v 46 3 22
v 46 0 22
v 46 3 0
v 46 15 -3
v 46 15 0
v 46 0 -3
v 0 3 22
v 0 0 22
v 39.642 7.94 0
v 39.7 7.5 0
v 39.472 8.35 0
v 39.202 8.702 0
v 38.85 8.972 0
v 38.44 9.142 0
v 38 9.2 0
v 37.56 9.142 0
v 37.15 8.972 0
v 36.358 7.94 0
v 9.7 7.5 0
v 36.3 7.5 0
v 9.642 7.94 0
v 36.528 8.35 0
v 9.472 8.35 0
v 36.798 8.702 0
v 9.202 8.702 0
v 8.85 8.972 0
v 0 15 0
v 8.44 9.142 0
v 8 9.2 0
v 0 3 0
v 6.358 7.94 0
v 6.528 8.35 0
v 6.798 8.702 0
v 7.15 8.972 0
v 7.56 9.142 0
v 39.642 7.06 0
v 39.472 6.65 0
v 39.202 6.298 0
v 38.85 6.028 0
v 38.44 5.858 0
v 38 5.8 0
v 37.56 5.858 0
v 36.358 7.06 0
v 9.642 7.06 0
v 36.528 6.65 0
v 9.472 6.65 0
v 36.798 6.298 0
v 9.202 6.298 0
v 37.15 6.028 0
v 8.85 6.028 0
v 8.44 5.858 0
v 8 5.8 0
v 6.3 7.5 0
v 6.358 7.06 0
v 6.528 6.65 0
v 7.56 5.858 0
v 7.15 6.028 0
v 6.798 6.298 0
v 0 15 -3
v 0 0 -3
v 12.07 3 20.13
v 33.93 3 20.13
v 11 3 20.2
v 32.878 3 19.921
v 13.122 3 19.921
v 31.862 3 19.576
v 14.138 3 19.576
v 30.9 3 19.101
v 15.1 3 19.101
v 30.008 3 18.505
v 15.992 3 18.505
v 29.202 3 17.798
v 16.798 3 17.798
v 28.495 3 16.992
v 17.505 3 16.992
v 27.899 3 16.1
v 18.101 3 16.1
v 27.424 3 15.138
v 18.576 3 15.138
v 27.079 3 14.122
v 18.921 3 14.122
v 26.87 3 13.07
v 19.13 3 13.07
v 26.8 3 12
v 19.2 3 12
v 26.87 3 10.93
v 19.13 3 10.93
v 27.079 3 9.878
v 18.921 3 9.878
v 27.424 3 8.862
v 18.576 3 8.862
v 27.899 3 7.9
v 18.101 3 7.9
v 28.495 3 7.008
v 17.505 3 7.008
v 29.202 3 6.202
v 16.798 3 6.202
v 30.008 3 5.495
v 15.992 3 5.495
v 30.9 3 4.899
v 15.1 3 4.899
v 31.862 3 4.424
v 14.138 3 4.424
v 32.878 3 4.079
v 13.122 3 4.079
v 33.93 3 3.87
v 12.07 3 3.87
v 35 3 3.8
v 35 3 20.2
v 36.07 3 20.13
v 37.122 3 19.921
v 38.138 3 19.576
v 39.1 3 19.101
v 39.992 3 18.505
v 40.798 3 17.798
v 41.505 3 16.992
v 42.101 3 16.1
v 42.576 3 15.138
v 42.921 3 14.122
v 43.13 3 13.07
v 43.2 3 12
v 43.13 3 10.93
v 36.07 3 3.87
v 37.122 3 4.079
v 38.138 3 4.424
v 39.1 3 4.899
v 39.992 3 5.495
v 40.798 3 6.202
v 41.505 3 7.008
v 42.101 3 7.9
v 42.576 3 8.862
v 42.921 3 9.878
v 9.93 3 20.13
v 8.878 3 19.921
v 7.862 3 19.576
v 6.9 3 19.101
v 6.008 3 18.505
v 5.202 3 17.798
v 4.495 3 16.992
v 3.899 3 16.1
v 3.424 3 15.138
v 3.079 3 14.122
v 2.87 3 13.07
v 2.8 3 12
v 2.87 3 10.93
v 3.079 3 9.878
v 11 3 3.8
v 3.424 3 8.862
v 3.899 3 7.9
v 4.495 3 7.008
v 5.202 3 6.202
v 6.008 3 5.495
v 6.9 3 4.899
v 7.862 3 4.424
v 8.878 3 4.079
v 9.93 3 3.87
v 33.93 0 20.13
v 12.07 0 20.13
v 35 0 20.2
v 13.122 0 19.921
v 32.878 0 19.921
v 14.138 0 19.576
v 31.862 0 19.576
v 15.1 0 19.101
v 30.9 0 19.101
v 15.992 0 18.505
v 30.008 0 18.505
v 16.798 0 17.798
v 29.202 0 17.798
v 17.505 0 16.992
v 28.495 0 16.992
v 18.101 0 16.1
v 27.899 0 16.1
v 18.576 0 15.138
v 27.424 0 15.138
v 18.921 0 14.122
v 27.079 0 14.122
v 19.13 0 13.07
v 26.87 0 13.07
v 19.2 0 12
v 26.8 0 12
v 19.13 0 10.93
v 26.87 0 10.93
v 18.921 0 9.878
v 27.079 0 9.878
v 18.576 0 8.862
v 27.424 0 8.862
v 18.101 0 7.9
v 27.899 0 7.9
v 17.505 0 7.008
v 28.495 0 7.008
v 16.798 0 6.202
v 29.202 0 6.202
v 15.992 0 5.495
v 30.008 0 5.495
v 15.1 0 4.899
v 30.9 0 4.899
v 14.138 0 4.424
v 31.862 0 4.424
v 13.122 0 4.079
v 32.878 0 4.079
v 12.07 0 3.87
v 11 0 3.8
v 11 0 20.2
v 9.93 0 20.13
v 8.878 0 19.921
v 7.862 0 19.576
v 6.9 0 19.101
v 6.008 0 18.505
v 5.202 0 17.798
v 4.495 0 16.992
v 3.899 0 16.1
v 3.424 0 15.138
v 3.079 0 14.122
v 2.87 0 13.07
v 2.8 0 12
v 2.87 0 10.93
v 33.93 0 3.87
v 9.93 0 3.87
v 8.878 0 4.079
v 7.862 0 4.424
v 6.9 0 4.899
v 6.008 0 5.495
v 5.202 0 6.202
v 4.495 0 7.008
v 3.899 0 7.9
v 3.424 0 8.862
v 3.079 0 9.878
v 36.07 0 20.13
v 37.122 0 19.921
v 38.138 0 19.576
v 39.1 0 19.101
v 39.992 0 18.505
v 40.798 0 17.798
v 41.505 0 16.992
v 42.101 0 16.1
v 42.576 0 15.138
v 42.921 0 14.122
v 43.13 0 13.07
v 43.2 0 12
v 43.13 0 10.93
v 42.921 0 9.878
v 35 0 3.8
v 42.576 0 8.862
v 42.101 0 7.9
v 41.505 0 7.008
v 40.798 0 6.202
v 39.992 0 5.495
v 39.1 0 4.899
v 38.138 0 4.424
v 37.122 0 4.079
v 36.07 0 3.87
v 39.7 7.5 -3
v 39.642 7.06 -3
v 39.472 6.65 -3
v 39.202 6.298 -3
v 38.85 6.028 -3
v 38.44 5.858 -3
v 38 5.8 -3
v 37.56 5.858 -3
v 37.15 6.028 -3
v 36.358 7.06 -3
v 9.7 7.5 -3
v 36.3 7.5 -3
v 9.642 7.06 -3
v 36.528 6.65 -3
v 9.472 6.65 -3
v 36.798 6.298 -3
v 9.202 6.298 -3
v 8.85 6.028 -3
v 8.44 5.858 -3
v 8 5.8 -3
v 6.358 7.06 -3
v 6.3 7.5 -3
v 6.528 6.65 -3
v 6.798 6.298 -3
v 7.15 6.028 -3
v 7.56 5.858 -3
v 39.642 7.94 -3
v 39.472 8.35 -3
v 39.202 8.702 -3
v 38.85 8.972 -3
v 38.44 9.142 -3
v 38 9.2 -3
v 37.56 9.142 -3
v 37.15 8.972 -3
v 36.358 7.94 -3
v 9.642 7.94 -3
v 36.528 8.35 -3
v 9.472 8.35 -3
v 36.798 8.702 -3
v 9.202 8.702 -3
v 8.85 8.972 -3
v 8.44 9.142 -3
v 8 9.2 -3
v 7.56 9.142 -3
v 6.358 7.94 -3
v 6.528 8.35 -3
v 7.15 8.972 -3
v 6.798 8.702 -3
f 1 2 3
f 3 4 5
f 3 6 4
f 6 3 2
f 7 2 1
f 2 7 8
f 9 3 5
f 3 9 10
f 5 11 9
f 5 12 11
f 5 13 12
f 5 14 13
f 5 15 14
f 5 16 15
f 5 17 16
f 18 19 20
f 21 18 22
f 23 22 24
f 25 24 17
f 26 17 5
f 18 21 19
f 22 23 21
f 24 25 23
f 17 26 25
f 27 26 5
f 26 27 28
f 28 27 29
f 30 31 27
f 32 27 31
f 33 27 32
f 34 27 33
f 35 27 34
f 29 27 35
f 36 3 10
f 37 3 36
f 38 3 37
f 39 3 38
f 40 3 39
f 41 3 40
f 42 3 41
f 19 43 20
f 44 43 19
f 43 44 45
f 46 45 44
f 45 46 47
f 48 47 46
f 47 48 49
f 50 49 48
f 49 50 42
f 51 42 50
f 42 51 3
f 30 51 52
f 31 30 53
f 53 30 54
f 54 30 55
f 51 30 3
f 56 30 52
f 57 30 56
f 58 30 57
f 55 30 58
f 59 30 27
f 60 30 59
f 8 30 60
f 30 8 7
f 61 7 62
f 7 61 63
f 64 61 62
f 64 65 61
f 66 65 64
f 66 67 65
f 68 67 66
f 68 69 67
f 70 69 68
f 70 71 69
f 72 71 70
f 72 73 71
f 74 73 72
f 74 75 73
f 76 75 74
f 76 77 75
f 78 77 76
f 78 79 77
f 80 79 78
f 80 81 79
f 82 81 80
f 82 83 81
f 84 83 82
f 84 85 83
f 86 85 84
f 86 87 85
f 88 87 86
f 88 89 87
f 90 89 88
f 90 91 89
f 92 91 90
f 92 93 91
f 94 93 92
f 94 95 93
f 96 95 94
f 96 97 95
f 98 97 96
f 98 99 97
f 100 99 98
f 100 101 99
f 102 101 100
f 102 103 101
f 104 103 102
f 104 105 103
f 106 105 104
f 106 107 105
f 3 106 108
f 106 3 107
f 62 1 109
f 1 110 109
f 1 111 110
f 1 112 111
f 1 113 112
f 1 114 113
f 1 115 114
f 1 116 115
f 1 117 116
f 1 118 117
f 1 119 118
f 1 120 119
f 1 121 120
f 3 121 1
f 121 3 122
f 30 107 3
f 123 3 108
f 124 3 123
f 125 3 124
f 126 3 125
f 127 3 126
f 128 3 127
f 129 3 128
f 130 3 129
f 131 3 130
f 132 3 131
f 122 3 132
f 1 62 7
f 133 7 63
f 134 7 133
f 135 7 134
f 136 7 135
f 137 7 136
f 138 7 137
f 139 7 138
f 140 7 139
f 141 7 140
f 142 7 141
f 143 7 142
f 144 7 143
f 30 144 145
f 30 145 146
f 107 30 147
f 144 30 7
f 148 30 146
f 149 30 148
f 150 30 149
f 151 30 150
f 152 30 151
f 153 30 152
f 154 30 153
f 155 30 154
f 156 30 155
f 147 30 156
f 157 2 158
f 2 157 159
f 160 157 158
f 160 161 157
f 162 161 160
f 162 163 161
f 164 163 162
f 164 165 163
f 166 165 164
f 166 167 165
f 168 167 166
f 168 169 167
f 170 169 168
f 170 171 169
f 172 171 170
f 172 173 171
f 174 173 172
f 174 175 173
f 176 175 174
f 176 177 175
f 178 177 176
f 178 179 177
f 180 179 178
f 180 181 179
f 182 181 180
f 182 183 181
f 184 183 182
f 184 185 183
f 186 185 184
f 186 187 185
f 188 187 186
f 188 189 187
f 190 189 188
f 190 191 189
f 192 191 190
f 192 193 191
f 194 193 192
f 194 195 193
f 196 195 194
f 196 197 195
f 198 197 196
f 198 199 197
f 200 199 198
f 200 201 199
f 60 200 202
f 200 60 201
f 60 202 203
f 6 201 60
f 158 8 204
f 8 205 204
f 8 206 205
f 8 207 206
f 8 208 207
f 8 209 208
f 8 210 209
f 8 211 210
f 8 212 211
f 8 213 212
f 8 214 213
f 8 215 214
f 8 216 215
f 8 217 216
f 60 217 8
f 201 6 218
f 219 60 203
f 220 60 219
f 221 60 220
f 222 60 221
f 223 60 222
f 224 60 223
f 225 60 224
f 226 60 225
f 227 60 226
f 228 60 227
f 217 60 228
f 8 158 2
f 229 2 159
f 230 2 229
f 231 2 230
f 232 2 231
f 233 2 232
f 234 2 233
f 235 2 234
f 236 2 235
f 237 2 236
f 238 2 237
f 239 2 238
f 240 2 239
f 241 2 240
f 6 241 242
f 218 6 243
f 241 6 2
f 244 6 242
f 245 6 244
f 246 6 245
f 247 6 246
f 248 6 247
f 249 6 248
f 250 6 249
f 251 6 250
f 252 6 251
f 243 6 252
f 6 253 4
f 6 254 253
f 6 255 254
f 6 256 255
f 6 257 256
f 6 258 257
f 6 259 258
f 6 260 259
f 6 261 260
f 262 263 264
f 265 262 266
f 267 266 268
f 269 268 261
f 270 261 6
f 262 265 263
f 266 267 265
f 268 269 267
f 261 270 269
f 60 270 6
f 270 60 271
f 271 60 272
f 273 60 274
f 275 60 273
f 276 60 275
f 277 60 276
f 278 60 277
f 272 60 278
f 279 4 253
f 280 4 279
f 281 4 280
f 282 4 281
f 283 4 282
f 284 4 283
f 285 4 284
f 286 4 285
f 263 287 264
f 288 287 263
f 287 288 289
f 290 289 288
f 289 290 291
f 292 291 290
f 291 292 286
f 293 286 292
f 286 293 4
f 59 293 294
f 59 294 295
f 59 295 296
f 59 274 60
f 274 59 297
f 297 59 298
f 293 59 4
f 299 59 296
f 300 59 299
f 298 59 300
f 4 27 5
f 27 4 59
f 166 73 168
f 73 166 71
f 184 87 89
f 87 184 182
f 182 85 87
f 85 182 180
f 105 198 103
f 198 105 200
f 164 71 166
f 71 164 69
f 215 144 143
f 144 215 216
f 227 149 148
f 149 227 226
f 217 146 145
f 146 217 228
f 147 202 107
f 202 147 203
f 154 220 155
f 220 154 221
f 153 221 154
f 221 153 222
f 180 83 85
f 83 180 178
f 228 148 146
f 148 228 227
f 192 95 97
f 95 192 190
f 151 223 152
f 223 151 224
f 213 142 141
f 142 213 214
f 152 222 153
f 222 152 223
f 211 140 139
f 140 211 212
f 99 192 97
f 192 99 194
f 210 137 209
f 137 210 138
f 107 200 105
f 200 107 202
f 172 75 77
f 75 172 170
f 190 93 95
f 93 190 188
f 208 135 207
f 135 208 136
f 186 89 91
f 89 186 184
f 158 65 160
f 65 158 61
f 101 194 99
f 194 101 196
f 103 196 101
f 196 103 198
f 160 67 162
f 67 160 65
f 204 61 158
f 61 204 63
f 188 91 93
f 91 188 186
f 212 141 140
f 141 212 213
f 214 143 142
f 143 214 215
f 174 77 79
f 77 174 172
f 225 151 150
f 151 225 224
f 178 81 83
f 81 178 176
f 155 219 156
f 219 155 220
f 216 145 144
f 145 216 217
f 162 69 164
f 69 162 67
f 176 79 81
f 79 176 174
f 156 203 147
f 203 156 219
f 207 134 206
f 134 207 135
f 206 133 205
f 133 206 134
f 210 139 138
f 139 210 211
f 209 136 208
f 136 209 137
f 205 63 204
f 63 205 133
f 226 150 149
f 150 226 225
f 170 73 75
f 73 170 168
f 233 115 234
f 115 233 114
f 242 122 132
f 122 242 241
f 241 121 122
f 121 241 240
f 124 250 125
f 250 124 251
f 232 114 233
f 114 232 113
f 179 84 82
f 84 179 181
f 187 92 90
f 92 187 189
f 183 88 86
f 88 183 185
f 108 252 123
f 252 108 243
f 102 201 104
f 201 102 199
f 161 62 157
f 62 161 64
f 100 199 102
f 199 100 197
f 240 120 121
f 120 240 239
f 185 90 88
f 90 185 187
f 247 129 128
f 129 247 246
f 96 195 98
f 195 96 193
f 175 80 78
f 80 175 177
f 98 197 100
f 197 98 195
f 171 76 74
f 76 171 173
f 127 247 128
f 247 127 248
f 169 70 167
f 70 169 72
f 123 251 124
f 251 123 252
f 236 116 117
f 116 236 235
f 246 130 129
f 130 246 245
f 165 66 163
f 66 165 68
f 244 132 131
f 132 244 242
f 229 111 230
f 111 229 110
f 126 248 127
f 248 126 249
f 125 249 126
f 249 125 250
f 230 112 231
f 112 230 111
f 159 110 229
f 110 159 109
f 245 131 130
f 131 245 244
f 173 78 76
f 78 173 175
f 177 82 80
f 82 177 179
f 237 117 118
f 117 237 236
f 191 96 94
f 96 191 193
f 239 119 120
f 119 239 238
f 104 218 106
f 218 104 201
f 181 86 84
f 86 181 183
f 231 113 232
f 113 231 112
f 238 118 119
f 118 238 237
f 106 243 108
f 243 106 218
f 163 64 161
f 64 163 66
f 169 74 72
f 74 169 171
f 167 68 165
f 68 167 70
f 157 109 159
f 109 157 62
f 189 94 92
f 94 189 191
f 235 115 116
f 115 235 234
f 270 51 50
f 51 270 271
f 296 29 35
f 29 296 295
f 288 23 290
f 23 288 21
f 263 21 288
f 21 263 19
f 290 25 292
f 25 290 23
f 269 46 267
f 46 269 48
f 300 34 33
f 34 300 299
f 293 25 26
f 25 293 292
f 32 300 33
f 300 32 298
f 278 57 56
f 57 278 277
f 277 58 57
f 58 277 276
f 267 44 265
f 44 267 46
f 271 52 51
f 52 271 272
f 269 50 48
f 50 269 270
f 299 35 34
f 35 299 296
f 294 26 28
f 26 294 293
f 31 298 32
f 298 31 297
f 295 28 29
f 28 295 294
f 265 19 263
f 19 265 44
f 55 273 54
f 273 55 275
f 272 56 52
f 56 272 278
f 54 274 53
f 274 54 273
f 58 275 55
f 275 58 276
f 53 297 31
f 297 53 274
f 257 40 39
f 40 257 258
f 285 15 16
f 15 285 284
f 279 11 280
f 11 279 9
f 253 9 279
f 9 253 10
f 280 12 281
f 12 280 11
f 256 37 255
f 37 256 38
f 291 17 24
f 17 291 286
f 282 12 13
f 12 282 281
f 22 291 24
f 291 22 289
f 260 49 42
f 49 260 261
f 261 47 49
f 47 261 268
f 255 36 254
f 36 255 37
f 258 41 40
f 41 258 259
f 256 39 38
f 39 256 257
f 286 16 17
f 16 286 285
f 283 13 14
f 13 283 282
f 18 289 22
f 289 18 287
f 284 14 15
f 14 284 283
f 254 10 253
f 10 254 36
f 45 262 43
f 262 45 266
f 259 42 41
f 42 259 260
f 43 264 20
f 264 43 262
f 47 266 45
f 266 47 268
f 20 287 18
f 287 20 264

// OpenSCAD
// Suport frontal de l'HC-SR04 (els "ulls" del rover). Cargols M3 a la placa.
difference() {
    union() {
        cube([46, 3, 22]);                        // placa frontal
        translate([0, 0, -3]) cube([46, 15, 3]);  // peu
    }
    translate([11, -1, 12]) rotate([-90, 0, 0]) cylinder(h = 5, d = 16.4, $fn = 48);
    translate([35, -1, 12]) rotate([-90, 0, 0]) cylinder(h = 5, d = 16.4, $fn = 48);
    translate([8, 7.5, -4]) cylinder(h = 5, d = 3.4, $fn = 24);
    translate([38, 7.5, -4]) cylinder(h = 5, d = 3.4, $fn = 24);
}
